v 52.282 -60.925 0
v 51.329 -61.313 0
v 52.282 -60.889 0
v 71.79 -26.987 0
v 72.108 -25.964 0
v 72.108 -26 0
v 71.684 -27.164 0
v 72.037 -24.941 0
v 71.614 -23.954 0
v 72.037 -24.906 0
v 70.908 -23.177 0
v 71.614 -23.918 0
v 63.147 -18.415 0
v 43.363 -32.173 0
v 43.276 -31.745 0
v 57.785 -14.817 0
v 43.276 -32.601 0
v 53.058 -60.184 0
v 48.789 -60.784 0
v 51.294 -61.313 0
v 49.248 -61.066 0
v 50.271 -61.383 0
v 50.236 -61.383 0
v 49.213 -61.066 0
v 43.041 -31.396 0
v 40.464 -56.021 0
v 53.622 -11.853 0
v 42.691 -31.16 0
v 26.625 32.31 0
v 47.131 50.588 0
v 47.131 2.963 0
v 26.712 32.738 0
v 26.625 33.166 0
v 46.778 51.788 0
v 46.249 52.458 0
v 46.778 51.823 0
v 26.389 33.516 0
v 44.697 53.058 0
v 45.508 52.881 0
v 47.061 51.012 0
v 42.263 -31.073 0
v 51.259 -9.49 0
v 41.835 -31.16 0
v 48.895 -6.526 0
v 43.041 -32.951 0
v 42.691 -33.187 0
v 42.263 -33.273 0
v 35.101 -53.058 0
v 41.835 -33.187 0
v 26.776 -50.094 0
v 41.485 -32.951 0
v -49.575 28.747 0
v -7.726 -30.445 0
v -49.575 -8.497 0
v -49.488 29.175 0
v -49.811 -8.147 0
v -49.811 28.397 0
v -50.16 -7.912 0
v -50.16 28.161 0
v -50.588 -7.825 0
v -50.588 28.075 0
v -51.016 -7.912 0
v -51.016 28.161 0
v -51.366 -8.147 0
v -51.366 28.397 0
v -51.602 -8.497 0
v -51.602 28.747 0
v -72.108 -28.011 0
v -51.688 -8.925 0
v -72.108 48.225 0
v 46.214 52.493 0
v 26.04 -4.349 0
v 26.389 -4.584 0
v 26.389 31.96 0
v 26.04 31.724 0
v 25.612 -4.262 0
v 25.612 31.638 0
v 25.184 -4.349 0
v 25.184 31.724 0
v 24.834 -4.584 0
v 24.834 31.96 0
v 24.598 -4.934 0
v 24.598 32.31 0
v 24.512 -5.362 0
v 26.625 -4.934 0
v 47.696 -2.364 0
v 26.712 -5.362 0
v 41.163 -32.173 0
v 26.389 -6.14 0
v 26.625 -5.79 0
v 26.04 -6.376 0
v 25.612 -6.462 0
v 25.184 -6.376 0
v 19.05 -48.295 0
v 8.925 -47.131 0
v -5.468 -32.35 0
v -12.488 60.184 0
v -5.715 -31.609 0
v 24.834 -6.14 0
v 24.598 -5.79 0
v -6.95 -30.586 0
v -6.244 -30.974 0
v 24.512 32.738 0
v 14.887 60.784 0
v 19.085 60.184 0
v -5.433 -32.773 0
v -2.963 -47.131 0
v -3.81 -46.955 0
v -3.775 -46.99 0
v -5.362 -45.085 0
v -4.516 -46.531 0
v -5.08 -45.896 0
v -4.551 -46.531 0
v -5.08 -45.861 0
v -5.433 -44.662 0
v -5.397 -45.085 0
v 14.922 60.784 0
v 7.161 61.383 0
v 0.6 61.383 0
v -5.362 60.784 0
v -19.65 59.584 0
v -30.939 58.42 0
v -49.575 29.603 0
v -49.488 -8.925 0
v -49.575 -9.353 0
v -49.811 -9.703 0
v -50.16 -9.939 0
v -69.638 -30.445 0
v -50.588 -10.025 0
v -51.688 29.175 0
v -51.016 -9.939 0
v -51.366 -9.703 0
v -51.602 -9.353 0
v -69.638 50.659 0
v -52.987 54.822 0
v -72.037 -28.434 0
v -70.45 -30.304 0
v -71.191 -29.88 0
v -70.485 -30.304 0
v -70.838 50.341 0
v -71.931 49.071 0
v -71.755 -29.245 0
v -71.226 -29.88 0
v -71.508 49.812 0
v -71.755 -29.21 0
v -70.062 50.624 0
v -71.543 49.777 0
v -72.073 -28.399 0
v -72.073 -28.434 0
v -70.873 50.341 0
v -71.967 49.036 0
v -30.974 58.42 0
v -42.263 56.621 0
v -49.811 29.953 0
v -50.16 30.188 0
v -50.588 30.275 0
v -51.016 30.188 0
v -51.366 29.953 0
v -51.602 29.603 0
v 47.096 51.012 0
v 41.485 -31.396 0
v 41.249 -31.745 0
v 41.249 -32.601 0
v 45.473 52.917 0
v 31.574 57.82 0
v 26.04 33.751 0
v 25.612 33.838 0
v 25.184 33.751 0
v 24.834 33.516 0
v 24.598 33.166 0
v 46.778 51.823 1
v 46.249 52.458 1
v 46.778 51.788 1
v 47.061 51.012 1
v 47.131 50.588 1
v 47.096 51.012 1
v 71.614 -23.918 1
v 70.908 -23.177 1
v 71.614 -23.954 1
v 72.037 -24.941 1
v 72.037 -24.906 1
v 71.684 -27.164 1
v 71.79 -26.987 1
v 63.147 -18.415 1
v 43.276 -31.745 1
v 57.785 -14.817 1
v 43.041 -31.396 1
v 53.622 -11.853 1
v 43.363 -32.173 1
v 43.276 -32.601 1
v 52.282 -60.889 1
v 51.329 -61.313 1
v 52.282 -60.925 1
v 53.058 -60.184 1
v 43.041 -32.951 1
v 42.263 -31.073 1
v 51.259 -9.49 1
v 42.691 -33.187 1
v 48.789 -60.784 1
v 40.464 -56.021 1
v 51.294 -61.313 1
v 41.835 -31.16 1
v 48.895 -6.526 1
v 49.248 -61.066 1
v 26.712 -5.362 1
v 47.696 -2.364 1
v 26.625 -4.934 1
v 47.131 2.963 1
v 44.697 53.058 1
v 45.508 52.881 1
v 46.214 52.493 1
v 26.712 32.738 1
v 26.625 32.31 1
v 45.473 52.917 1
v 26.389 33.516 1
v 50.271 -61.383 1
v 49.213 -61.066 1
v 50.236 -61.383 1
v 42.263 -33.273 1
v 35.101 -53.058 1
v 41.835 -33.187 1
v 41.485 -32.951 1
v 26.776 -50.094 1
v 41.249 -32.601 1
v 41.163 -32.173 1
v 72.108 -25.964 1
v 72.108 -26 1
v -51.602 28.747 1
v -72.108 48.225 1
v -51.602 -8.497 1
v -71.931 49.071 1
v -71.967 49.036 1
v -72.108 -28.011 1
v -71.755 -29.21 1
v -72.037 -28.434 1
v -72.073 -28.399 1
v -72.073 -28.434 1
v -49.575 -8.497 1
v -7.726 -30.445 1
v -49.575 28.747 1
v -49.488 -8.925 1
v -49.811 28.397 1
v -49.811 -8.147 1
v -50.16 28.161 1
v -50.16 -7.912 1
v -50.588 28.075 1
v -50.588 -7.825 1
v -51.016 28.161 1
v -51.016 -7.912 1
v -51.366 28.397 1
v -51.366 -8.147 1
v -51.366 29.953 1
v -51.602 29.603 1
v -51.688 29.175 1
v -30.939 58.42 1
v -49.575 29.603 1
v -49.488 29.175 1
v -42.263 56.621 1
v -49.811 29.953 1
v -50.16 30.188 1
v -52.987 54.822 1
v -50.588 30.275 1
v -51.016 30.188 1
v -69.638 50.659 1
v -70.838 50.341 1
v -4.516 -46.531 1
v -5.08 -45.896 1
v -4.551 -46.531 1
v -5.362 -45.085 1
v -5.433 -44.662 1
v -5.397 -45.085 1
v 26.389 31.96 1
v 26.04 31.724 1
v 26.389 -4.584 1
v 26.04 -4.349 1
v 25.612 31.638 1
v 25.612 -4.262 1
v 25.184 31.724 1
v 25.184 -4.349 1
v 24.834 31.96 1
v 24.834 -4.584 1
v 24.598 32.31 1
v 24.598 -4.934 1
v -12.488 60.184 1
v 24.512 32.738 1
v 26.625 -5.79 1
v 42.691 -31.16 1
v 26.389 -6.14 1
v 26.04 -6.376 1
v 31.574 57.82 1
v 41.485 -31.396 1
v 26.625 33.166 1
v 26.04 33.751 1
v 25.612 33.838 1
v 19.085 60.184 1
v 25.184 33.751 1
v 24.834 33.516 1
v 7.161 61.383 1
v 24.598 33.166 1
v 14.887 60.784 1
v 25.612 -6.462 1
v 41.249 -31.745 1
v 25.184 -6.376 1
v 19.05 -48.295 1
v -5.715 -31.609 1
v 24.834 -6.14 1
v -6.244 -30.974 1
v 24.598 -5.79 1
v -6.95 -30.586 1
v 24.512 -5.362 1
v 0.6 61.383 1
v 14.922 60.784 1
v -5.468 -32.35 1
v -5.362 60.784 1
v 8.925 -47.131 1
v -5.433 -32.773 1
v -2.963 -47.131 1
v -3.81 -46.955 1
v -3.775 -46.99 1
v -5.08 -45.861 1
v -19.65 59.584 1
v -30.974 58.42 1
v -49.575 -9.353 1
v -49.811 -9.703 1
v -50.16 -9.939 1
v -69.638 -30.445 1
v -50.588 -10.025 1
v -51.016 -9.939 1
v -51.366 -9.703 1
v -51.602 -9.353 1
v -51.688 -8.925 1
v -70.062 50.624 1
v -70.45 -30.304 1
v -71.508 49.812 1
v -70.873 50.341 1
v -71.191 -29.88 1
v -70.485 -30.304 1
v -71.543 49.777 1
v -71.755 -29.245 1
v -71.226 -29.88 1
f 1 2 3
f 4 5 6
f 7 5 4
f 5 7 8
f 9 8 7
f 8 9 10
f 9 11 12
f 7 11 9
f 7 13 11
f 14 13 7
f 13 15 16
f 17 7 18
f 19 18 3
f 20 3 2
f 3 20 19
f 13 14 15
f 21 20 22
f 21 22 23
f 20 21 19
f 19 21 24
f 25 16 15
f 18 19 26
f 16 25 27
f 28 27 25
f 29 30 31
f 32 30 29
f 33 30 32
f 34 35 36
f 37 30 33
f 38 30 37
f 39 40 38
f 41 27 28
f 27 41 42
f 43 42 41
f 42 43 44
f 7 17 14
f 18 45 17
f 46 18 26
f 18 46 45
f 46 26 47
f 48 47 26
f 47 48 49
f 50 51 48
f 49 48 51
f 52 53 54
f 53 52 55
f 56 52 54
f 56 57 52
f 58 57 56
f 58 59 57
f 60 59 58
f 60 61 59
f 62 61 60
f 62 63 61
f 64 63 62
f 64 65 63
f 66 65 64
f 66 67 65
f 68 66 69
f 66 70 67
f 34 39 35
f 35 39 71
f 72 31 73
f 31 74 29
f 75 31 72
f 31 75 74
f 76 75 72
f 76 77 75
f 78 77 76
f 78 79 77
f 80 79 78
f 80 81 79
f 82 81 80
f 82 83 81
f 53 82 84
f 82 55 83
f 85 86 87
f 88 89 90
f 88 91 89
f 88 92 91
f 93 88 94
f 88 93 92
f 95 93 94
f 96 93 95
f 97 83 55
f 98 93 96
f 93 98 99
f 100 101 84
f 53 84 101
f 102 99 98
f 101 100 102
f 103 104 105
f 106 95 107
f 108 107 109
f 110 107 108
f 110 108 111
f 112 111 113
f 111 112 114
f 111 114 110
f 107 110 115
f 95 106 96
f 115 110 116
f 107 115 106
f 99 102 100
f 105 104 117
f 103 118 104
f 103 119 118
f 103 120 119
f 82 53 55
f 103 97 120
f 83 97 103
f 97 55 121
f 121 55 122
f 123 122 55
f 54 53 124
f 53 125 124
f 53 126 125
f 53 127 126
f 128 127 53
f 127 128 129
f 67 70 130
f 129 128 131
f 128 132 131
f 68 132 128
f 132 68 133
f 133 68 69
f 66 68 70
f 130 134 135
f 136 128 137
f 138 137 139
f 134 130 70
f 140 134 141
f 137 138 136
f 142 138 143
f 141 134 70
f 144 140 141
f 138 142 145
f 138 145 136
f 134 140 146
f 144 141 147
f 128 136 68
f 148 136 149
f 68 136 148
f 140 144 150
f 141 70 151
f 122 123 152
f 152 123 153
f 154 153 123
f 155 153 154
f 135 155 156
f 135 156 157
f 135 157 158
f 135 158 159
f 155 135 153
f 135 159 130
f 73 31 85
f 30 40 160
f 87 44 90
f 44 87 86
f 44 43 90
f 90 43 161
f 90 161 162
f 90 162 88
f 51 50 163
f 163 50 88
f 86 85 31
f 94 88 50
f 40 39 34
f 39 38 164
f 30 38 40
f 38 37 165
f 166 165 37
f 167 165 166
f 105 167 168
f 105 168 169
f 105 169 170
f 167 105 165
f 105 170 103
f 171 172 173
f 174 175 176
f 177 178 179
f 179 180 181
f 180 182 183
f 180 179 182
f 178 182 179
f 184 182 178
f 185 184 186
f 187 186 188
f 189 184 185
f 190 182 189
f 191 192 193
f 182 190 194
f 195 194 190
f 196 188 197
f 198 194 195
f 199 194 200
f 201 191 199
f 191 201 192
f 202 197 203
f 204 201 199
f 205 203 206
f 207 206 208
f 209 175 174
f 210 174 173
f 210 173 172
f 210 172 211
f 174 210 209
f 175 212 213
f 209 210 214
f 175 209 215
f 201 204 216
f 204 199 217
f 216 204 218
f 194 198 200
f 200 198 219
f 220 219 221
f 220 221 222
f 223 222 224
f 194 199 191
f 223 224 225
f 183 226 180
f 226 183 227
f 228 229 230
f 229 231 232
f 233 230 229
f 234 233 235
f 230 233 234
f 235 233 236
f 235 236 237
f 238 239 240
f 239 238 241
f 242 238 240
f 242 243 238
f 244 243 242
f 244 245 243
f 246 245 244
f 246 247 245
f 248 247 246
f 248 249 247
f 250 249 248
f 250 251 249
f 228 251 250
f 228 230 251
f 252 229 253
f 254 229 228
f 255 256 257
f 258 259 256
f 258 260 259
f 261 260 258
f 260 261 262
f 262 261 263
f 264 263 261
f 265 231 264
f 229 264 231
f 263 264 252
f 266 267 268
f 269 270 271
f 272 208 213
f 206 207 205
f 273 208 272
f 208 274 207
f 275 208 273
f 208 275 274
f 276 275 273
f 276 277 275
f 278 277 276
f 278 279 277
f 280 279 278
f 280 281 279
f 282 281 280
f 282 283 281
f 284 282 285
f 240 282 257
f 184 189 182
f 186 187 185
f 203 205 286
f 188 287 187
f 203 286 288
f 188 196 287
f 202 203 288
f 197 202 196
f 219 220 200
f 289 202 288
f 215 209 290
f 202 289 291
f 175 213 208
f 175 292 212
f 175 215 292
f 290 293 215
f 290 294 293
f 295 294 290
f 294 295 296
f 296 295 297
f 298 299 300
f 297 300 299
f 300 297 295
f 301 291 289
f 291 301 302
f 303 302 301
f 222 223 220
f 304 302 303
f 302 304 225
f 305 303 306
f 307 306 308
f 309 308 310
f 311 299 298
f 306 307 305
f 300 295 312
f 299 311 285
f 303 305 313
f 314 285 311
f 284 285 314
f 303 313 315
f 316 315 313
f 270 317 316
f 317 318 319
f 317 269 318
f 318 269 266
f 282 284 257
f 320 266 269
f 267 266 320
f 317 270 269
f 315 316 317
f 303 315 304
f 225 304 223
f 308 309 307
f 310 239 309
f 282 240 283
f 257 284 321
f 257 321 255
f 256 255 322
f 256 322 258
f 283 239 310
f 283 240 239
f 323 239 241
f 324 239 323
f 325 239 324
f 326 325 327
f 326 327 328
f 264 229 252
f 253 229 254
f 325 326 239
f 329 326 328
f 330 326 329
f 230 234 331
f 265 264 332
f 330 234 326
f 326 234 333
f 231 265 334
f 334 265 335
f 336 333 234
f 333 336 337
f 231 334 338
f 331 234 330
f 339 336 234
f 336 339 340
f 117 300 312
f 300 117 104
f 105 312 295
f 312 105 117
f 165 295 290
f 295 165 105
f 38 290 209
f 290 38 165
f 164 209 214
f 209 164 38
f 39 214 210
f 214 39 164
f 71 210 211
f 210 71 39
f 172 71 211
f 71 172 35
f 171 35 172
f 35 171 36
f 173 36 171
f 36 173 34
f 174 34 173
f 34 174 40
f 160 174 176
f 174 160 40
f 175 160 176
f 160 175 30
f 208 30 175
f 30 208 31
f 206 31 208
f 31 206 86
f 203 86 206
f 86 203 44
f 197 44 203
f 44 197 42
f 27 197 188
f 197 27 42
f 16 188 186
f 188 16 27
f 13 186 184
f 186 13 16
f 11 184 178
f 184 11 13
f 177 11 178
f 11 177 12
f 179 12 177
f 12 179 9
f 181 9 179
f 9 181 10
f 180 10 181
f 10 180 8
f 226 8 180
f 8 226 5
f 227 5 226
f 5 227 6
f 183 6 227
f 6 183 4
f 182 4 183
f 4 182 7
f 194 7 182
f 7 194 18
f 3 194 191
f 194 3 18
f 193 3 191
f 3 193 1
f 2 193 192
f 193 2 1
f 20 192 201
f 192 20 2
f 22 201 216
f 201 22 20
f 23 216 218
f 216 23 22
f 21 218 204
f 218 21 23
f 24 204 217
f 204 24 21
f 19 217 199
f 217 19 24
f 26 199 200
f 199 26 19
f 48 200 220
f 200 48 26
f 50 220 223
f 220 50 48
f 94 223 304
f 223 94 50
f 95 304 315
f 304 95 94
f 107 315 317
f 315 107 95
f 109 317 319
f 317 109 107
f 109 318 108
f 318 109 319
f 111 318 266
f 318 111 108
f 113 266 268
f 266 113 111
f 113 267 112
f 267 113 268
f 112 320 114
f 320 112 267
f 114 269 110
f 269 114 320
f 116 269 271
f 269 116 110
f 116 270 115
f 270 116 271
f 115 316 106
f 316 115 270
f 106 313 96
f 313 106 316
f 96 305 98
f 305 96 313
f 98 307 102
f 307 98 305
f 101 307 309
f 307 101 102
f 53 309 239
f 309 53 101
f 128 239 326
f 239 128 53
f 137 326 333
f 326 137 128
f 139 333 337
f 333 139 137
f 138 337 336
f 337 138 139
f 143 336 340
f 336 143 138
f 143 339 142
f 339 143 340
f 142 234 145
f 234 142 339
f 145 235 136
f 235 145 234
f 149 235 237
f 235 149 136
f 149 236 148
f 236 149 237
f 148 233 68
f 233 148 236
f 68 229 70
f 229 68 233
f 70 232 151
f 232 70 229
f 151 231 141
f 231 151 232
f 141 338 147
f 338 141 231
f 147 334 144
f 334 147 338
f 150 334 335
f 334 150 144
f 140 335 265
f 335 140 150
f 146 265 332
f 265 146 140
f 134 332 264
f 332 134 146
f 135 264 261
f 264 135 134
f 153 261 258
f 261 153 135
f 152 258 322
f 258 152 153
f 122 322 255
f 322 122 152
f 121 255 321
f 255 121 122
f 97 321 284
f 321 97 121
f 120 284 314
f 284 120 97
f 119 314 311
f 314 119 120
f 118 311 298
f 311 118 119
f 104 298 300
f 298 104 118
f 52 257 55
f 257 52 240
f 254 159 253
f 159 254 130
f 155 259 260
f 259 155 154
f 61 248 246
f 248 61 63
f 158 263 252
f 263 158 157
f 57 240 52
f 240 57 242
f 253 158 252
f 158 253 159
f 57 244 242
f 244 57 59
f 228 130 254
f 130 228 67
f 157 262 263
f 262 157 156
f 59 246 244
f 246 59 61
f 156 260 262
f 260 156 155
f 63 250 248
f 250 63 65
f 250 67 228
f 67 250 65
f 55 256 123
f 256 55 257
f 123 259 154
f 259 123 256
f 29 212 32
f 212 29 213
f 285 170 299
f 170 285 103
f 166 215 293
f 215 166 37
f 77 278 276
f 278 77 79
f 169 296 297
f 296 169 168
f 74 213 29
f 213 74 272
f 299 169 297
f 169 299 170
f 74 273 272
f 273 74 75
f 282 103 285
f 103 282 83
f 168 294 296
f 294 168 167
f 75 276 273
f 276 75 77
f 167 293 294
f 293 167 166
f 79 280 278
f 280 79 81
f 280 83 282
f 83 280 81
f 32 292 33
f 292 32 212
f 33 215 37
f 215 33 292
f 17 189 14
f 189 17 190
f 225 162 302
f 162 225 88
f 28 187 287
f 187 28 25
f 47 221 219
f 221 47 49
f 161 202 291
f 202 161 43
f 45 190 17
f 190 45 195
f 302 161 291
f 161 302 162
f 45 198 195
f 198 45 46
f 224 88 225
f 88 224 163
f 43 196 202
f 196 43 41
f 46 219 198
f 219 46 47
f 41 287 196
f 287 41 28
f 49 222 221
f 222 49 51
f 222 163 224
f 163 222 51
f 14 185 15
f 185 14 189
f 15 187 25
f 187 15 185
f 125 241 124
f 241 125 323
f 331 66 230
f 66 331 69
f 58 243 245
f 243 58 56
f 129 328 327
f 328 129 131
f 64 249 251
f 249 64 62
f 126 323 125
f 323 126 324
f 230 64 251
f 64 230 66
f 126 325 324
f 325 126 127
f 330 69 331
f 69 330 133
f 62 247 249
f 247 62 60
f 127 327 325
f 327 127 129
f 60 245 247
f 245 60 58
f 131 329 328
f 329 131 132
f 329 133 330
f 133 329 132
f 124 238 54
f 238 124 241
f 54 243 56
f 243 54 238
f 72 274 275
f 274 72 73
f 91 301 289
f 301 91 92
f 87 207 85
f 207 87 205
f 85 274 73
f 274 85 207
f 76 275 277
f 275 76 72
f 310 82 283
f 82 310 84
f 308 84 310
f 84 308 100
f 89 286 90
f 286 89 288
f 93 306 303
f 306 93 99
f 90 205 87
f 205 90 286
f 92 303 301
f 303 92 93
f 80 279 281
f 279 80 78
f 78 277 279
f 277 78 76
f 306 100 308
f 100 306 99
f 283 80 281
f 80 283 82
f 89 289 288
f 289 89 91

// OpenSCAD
// Module names are of the form poly_<inkscape-path-id>().  As a result,
// you can associate a polygon in this OpenSCAD program with the corresponding
// SVG element in the Inkscape document by looking for the XML element with
// the attribute id="inkscape-path-id".

// fudge value is used to ensure that subtracted solids are a tad taller
// in the z dimension than the polygon being subtracted from.  This helps
// keep the resulting .stl file manifold.
fudge = 0.1;

difference() {
   poly_path3414(1); // main form
   translate([0,0,-0.1]) scale ([1,1,1.5]) poly_path3398(1); // hole (top left)
   translate([0,0,-0.1]) scale ([1,1,1.5]) poly_path3402(1); // hole (top right)
   // poly_path3418(1); // main form (again?)
   translate([0,0,-0.1]) scale ([1,1,1.5]) poly_path3394(1); // hole (bottom right thumb)
   translate([0,0,-0.1]) scale ([1,1,1.5]) poly_path3410(1); // hole (bottom left)
   translate([0,0,-0.1]) scale ([1,1,1.5]) poly_path3406(1); // hole (bottom right)
}

module poly_path3398(h)
{
  scale([25.4/90, -25.4/90, 1]) union()
  {
    linear_extrude(height=h)
      polygon([[-179.249875,-107.272625],[-177.732805,-106.966336],[-176.493937,-106.131062],[-175.658664,-104.892195],[-175.352375,-103.375125],[-175.658664,-101.858055],[-176.493937,-100.619187],[-177.732805,-99.783914],[-179.249875,-99.477625],[-180.766945,-99.783914],[-182.005812,-100.619187],[-182.841086,-101.858055],[-183.147375,-103.375125],[-182.841086,-104.892195],[-182.005812,-106.131062],[-180.766945,-106.966336],[-179.249875,-107.272625]]);
  }
}

module poly_path3402(h)
{
  scale([25.4/90, -25.4/90, 1]) union()
  {
    linear_extrude(height=h)
      polygon([[90.750125,-119.897500],[92.267195,-119.591211],[93.506062,-118.755937],[94.341336,-117.517070],[94.647625,-116.000000],[94.341336,-114.482930],[93.506062,-113.244062],[92.267195,-112.408789],[90.750125,-112.102500],[89.233055,-112.408789],[87.994188,-113.244062],[87.158914,-114.482930],[86.852625,-116.000000],[87.158914,-117.517070],[87.994188,-118.755937],[89.233055,-119.591211],[90.750125,-119.897500]]);
  }
}

module poly_path3418(h)
{
  scale([25.4/90, -25.4/90, 1]) union()
  {
    linear_extrude(height=h)
      polygon([[2.125125,-216.999875],[-18.874875,-214.874875],[-44.249875,-212.749875],[-69.499875,-210.624875],[-109.624875,-206.374875],[-149.624875,-200.124875],[-187.624875,-193.749875],[-246.624875,-178.999875],[-246.749875,-178.999875],[-248.124875,-178.874875],[-250.874875,-177.874875],[-252.999875,-176.124875],[-254.374875,-173.624875],[-254.874875,-170.749875],[-254.874875,99.125125],[-254.749875,100.625125],[-253.874875,103.250125],[-251.999875,105.500125],[-249.499875,106.875125],[-246.749875,107.375125],[-27.374875,107.375125],[-24.499875,107.875125],[-24.374875,107.875125],[-21.874875,109.375125],[-21.749875,109.375125],[-19.874875,111.625125],[-19.874875,111.750125],[-18.874875,114.500125],[-18.749875,114.625125],[-18.624875,116.000125],[-18.624875,158.250125],[-18.499875,159.625125],[-17.624875,162.375125],[-15.749875,164.500125],[-13.249875,165.875125],[-10.499875,166.375125],[31.625125,166.375125],[31.750125,166.375125],[67.625125,170.625125],[95.000125,177.000125],[124.625125,187.500125],[143.625125,198.125125],[173.125125,215.000125],[174.625125,215.875125],[178.125125,217.000125],[181.625125,216.750125],[185.000125,215.375125],[187.625125,212.875125],[253.500125,96.000125],[253.875125,95.375125],[254.875125,92.000125],[254.750125,88.375125],[253.375125,85.125125],[250.875125,82.500125],[223.500125,65.625125],[204.500125,53.000125],[189.750125,42.500125],[189.750125,42.375125],[181.250125,34.000125],[172.750125,23.375125],[168.500125,8.500125],[166.375125,-10.499875],[166.375125,-179.249875],[166.250125,-180.624875],[165.375125,-183.374875],[163.500125,-185.499875],[161.000125,-186.874875],[158.250125,-187.374875],[158.125125,-187.499875],[111.750125,-204.249875],[67.500125,-212.749875],[52.750125,-214.874875],[25.375125,-216.999875]]);
  }
}

module poly_path3394(h)
{
  scale([25.4/90, -25.4/90, 1]) union()
  {
    linear_extrude(height=h)
      polygon([[149.750125,110.102500],[151.267195,110.408789],[152.506062,111.244063],[153.341336,112.482930],[153.647625,114.000000],[153.341336,115.517070],[152.506062,116.755938],[151.267195,117.591211],[149.750125,117.897500],[148.233055,117.591211],[146.994188,116.755938],[146.158914,115.517070],[145.852625,114.000000],[146.158914,112.482930],[146.994188,111.244063],[148.233055,110.408789],[149.750125,110.102500]]);
  }
}

module poly_path3410(h)
{
  scale([25.4/90, -25.4/90, 1]) union()
  {
    linear_extrude(height=h)
      polygon([[-179.249875,27.727500],[-177.732805,28.033789],[-176.493937,28.869063],[-175.658664,30.107930],[-175.352375,31.625000],[-175.658664,33.142070],[-176.493937,34.380938],[-177.732805,35.216211],[-179.249875,35.522500],[-180.766945,35.216211],[-182.005812,34.380938],[-182.841086,33.142070],[-183.147375,31.625000],[-182.841086,30.107930],[-182.005812,28.869063],[-180.766945,28.033789],[-179.249875,27.727500]]);
  }
}

module poly_path3406(h)
{
  scale([25.4/90, -25.4/90, 1]) union()
  {
    linear_extrude(height=h)
      polygon([[90.750125,15.102500],[92.267195,15.408789],[93.506062,16.244063],[94.341336,17.482930],[94.647625,19.000000],[94.341336,20.517070],[93.506062,21.755938],[92.267195,22.591211],[90.750125,22.897500],[89.233055,22.591211],[87.994188,21.755938],[87.158914,20.517070],[86.852625,19.000000],[87.158914,17.482930],[87.994188,16.244063],[89.233055,15.408789],[90.750125,15.102500]]);
  }
}

module poly_path3414(h)
{
  scale([25.4/90, -25.4/90, 1]) union()
  {
    linear_extrude(height=h)
      polygon([[178.000000,217.500000],[178.000000,217.500000],[174.500000,216.375000],[174.375000,216.375000],[172.875000,215.375000],[143.375000,198.500000],[124.375000,188.000000],[94.875000,177.500000],[67.500000,171.125000],[31.625000,167.000000],[-10.500000,167.000000],[-13.375000,166.500000],[-13.500000,166.375000],[-16.000000,164.875000],[-16.125000,164.875000],[-18.000000,162.625000],[-18.000000,162.500000],[-19.000000,159.750000],[-19.125000,159.750000],[-19.250000,158.250000],[-19.250000,116.125000],[-19.375000,114.625000],[-20.250000,112.000000],[-22.125000,109.750000],[-24.625000,108.375000],[-27.375000,107.875000],[-246.750000,107.875000],[-249.625000,107.375000],[-249.750000,107.375000],[-252.250000,105.875000],[-252.375000,105.875000],[-254.250000,103.625000],[-254.250000,103.500000],[-255.250000,100.750000],[-255.375000,100.750000],[-255.375000,100.625000],[-255.500000,99.250000],[-255.500000,99.125000],[-255.500000,-170.875000],[-255.000000,-173.750000],[-254.875000,-173.875000],[-253.500000,-176.375000],[-253.375000,-176.500000],[-251.125000,-178.375000],[-251.000000,-178.375000],[-248.250000,-179.375000],[-246.750000,-179.500000],[-187.750000,-194.250000],[-149.750000,-200.625000],[-109.750000,-207.000000],[-109.625000,-207.000000],[-69.625000,-211.125000],[-44.250000,-213.250000],[-19.000000,-215.375000],[2.125000,-217.500000],[25.375000,-217.500000],[52.750000,-215.375000],[52.875000,-215.375000],[67.625000,-213.250000],[111.875000,-204.875000],[158.375000,-188.000000],[161.125000,-187.500000],[161.250000,-187.375000],[163.750000,-186.000000],[163.875000,-185.875000],[165.750000,-183.625000],[165.750000,-183.500000],[166.750000,-180.750000],[166.875000,-180.750000],[167.000000,-179.250000],[167.000000,-10.500000],[169.000000,8.375000],[173.250000,23.125000],[181.625000,33.625000],[190.000000,42.000000],[204.750000,52.500000],[223.750000,65.250000],[251.250000,82.125000],[253.750000,84.750000],[253.750000,84.875000],[255.250000,88.250000],[255.250000,88.375000],[255.500000,92.000000],[255.500000,92.125000],[254.375000,95.625000],[254.000000,96.250000],[188.000000,213.250000],[185.250000,215.750000],[185.250000,215.875000],[181.875000,217.250000],[181.750000,217.250000],[178.125000,217.500000]]);
  }
}
